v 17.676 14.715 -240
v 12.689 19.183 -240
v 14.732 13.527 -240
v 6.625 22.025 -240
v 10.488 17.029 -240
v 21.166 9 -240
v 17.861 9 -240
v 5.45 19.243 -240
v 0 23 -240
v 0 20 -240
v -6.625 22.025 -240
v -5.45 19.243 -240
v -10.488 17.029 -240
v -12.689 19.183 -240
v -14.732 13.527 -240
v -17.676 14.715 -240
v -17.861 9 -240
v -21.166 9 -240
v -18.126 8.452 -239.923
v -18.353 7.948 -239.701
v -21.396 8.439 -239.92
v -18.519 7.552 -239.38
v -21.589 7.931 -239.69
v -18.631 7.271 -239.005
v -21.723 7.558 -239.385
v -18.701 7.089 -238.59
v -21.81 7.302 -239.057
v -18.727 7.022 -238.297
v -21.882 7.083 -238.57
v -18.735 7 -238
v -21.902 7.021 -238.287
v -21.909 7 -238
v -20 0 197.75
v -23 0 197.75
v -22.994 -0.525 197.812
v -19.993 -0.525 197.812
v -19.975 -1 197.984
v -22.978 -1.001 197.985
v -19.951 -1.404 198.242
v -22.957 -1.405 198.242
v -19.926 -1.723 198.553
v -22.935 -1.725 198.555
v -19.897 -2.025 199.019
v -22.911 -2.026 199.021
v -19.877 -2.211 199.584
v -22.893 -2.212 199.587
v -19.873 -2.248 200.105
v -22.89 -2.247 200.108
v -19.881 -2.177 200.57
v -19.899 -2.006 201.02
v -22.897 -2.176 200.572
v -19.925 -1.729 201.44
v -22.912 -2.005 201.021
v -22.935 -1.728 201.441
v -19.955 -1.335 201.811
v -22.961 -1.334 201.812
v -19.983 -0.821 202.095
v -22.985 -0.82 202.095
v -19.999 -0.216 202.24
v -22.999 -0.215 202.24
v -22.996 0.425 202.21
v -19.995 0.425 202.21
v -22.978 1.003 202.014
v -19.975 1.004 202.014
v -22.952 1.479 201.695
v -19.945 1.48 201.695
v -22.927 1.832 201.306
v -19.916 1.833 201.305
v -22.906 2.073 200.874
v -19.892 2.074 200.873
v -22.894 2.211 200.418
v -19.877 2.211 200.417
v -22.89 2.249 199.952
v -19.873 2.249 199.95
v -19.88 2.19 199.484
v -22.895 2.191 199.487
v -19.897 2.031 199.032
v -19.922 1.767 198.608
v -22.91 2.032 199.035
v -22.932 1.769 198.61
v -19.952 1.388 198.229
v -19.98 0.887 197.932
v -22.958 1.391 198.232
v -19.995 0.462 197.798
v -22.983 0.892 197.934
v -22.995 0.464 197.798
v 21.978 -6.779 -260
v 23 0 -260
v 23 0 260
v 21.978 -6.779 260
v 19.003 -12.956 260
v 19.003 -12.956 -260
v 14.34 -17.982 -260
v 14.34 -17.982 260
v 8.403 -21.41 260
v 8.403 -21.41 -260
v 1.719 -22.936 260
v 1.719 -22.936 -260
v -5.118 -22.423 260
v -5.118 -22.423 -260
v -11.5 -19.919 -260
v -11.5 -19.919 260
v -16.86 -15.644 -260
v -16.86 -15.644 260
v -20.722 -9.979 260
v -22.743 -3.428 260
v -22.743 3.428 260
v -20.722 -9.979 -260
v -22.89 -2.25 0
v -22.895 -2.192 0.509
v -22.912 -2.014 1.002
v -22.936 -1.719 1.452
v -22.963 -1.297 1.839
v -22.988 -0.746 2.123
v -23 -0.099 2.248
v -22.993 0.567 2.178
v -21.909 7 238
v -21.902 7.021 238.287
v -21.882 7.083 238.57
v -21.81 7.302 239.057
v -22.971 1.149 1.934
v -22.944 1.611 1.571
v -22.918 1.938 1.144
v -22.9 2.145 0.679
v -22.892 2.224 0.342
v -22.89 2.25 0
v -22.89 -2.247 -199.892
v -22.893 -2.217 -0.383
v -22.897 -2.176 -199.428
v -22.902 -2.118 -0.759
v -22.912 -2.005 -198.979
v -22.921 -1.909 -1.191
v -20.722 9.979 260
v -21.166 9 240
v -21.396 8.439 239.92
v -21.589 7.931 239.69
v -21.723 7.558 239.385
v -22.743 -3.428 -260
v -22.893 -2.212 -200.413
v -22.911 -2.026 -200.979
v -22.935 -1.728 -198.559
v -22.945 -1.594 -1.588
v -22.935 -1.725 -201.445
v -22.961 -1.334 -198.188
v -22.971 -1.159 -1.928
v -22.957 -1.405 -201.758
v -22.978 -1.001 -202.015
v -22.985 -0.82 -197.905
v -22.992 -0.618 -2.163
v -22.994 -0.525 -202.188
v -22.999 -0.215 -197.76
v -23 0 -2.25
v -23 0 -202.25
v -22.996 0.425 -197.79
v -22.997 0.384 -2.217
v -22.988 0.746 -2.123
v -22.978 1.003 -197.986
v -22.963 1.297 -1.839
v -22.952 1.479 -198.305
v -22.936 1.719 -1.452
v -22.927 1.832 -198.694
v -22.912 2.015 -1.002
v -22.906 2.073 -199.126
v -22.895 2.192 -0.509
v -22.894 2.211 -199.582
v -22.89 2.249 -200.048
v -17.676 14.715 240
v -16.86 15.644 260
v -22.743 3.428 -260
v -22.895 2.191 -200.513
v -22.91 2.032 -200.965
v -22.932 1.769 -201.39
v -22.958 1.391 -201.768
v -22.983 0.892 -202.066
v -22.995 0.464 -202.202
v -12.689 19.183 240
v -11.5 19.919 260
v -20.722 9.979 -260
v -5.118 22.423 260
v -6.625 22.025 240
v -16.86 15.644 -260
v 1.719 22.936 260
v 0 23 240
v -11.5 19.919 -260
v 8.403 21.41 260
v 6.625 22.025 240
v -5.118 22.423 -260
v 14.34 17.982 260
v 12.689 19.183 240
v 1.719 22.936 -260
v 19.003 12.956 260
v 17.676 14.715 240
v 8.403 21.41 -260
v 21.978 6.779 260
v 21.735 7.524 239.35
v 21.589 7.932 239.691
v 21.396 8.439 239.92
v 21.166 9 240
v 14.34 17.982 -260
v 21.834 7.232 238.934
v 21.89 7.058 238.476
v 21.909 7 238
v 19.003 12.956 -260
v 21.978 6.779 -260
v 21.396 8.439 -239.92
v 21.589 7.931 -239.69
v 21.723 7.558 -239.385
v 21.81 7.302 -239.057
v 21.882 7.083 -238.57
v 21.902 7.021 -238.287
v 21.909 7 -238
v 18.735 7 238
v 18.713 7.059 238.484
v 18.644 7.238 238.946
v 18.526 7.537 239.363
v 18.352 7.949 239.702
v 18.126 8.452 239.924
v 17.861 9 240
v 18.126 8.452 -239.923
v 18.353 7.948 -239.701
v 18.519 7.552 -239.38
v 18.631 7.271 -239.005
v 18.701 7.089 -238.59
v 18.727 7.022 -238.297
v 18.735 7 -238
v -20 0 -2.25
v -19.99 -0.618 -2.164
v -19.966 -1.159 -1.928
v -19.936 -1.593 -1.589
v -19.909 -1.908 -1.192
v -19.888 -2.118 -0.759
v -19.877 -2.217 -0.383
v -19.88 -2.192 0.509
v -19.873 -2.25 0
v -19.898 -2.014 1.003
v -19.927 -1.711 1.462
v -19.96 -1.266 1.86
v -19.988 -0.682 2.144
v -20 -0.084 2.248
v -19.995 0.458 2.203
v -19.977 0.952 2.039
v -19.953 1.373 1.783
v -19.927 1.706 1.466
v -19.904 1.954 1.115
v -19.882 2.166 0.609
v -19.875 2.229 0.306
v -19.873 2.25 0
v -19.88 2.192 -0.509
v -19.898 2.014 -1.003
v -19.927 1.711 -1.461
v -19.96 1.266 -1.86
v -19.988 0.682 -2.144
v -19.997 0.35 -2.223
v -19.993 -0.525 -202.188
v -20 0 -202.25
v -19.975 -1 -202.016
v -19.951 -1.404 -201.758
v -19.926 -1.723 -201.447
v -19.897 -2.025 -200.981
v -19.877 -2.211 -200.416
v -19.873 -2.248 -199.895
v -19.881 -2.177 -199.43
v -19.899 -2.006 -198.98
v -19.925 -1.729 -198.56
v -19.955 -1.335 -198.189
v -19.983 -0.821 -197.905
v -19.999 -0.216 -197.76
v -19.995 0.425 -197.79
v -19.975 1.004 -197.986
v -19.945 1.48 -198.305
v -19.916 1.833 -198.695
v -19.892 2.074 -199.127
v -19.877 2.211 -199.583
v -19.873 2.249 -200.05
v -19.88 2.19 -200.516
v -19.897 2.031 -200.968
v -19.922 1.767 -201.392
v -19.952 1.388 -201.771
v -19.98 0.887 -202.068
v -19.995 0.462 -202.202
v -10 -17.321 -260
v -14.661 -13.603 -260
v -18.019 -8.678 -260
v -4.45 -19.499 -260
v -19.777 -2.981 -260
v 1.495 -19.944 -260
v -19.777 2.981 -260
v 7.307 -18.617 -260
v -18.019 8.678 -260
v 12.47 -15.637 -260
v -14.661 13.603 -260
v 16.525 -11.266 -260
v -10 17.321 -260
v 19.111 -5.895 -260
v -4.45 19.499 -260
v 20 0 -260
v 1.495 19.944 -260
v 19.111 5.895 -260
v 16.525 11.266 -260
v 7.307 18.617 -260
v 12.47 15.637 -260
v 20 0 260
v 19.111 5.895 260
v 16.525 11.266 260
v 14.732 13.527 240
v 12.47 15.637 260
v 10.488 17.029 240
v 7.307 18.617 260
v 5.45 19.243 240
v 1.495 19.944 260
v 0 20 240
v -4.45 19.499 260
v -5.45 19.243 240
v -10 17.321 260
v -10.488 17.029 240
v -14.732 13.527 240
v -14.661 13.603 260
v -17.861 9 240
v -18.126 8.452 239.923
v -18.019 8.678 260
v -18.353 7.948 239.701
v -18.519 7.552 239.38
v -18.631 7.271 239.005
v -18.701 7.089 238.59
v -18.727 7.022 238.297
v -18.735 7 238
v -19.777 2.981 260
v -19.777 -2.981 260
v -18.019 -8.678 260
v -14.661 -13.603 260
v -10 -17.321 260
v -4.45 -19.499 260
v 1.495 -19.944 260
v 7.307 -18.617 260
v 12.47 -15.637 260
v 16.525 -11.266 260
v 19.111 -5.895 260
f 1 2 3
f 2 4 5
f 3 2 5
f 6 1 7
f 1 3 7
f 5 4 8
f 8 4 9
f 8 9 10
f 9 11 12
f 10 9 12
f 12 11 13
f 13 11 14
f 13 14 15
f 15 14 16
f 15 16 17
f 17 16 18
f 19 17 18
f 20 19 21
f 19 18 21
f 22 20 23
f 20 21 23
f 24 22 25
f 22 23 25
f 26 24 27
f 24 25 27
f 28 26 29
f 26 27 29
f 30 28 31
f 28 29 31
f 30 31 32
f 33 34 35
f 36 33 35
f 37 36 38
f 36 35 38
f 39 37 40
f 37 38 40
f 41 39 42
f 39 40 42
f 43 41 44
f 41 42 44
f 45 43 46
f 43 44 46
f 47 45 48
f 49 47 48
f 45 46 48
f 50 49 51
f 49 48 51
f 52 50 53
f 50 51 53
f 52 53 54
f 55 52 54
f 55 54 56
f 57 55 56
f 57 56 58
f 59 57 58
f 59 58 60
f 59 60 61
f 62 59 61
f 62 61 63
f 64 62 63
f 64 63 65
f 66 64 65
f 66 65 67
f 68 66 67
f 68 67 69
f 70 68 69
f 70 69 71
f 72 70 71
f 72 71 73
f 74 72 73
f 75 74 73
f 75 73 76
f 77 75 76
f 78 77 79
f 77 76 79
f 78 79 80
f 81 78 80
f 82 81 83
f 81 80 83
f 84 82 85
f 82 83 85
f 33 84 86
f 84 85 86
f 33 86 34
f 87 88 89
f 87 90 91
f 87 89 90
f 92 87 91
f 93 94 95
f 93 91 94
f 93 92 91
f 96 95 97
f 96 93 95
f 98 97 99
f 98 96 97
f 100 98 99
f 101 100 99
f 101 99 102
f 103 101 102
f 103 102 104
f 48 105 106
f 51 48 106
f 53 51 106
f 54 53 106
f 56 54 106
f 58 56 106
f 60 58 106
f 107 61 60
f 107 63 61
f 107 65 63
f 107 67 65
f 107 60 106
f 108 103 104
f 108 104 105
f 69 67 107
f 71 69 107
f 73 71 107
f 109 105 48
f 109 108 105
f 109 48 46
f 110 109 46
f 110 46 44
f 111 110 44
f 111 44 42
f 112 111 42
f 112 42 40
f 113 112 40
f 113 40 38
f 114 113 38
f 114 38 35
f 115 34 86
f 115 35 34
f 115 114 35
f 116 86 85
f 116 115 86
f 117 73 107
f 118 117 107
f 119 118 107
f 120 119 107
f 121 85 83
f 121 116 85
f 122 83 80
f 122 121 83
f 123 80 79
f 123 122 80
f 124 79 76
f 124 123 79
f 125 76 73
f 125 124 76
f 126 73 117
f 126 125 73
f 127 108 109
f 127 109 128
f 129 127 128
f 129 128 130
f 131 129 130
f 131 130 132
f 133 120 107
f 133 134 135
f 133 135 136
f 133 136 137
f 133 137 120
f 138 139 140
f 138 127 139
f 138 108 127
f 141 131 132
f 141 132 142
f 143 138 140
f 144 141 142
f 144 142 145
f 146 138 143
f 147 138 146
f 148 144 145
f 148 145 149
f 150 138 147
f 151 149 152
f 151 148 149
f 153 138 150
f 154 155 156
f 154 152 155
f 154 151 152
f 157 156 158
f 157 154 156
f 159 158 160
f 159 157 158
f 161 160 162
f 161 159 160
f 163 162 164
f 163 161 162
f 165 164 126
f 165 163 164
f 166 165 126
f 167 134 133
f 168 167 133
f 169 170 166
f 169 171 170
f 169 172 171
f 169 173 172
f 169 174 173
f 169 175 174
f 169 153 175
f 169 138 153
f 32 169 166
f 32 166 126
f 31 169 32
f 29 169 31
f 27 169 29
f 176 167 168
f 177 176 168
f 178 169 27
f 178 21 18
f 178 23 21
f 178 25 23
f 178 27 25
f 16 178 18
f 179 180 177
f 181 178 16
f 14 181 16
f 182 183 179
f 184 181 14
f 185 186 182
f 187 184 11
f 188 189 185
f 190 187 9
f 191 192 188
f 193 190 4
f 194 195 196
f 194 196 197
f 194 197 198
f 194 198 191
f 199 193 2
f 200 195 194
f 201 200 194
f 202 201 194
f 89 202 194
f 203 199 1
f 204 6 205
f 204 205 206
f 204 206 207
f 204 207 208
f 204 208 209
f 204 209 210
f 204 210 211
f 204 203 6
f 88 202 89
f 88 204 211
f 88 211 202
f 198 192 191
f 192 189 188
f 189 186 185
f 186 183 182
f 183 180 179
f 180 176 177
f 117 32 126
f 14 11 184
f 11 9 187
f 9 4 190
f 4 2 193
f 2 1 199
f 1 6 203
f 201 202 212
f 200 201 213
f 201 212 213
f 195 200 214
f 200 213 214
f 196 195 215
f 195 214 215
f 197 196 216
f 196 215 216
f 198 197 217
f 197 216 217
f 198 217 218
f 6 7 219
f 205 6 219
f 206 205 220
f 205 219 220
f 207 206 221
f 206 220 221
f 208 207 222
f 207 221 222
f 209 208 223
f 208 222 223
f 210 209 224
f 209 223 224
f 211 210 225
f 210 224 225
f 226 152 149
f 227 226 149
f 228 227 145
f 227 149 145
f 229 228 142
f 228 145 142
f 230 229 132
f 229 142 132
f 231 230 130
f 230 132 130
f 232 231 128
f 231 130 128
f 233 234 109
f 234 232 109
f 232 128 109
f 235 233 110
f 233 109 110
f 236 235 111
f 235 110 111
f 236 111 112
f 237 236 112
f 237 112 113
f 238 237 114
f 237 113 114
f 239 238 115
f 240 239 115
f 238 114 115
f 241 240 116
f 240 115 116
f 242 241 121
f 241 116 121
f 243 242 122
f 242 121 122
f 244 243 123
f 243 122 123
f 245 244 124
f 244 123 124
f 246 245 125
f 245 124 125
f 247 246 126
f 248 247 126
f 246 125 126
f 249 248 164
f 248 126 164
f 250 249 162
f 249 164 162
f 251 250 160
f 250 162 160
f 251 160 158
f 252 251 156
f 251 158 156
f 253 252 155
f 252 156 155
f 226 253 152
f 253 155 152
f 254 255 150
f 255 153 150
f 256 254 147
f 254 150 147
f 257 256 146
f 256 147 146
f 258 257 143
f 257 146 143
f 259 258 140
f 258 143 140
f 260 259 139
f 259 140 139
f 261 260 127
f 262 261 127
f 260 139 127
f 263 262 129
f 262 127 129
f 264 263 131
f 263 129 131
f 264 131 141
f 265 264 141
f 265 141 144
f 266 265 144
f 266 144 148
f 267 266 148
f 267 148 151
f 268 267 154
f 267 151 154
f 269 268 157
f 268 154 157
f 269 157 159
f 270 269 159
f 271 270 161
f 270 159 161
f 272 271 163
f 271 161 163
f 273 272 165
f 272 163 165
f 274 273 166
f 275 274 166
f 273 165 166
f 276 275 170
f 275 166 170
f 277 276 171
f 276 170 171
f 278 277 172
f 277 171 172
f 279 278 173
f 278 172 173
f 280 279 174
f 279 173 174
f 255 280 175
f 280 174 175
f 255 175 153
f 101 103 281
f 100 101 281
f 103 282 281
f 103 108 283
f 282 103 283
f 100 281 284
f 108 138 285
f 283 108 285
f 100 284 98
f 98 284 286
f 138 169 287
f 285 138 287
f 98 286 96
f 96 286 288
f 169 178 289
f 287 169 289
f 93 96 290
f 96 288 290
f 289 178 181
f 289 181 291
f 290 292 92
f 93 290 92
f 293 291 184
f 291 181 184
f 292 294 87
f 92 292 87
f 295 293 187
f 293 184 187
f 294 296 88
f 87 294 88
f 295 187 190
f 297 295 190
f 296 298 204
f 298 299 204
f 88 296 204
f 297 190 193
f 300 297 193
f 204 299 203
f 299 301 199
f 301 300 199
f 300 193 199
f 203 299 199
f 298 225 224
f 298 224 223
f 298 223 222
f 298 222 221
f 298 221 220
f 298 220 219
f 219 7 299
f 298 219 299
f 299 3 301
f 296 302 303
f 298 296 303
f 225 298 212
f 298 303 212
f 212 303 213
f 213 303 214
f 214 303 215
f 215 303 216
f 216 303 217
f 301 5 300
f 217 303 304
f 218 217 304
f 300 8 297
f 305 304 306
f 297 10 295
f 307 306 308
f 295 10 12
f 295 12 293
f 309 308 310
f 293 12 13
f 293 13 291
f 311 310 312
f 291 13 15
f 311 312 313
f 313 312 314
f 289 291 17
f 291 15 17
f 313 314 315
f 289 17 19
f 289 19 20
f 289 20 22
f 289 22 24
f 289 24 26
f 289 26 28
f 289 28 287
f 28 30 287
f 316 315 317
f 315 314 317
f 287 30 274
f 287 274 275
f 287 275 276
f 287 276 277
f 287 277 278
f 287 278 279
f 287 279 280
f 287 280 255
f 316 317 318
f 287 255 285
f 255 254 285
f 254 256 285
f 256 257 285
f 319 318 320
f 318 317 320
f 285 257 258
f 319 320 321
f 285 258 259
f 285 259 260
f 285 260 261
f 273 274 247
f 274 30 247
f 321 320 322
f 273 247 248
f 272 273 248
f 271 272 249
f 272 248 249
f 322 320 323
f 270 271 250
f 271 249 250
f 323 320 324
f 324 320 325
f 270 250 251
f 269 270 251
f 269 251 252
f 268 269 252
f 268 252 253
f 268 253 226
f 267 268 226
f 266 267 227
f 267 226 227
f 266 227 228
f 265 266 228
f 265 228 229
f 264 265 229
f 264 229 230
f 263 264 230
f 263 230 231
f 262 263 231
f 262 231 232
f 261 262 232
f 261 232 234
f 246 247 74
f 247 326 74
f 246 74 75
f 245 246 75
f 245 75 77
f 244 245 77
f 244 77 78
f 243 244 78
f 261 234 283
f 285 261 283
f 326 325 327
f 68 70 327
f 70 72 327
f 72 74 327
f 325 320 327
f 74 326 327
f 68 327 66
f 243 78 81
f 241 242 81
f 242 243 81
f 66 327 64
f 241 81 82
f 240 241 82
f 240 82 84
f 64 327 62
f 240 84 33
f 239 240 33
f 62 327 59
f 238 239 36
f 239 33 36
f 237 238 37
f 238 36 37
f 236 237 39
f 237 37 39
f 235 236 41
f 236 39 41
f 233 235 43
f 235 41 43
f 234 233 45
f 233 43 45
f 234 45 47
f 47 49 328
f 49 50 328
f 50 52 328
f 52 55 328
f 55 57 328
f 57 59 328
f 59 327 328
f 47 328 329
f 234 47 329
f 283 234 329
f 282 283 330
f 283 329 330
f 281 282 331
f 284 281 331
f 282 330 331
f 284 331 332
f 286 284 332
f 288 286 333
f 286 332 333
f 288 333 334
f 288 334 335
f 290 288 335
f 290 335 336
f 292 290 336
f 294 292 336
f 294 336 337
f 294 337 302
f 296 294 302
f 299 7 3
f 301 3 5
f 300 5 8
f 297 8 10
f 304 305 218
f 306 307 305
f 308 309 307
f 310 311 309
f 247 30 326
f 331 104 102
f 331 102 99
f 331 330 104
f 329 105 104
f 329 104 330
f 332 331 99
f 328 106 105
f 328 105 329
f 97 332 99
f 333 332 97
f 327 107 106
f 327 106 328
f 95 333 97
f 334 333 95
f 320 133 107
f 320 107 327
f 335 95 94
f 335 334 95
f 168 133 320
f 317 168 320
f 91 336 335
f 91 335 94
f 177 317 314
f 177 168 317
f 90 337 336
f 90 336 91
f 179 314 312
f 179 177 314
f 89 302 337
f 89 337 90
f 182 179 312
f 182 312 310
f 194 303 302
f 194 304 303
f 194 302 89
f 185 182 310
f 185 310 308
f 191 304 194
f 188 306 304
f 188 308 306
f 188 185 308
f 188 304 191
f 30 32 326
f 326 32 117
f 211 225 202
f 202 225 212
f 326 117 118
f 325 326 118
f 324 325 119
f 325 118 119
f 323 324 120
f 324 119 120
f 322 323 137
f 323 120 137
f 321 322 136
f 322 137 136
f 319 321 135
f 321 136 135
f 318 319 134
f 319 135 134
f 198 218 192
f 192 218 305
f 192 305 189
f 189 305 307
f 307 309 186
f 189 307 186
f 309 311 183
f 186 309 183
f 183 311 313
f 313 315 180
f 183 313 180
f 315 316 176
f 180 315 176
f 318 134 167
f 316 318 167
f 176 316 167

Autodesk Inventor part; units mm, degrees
ref_plane "YZ Plane" through (0, 0, 0) normal (1, 0, 0) x (0, 1, 0)
ref_plane "XZ Plane" through (0, 0, 0) normal (0, 1, 0) x (-1, 0, 0)
ref_plane "XY Plane" through (0, 0, 0) normal (0, 0, 1) x (1, 0, 0)
sketch "Sketch1" plane through (0, 0, 0) normal (0, 0, 1) x (1, 0, 0)
  circle A0 centre (0, 0) radius 20
  circle A1 centre (0, 0) radius 23
  dimension "d0" = 40
  dimension "d1" = 46
extrude "Extrusion1" add sketch "Sketch1" along normal mid plane 520
sketch "Sketch2" plane through (0, 0, 0) normal (1, 0, 0) x (0, 1, 0)
  line L0 (0, 280) -> (0, -280) projected
  line L1 (-280, 0) -> (280, 0) projected
  point P0 (0, 0)
  point P1 (0, 200)
  point P2 (0, 0)
  point P3 (0, -200)
  dimension "d4" = 200
  dimension "d5" = 200
hole "Hole1" at (0, 0, 200) at (0, 0, 0) at (0, 0, -200) direction (-1, 0, 0) diameter 4.5 end through all clearance for "Flat Head Machine Screw" size "M4" standard "Ansi Metric M Profile"
sketch "Sketch3" plane through (0, 0, 0) normal (1, 0, 0) x (0, 1, 0)
  line L0 (23, -240) -> (7, -240)
  line L1 (7, -240) -> (7, 240)
  line L2 (7, 240) -> (23, 240)
  line L3 (23, 240) -> (23, -240)
  line L4 (23, 260) -> (-23, 260) projected
  line L5 (-23, -260) -> (23, -260) projected
  line L6 (0, 350) -> (0, -350) projected
  point P0 (0, 0)
  dimension "d13" = 20
  dimension "d14" = 20
  dimension "d15" = 7
extrude "Extrusion2" cut sketch "Sketch3" along normal through all both and the other way through all
fillet "Fillet1" radius 2 4 edges at (20.3219, 7, -240) (-20.3219, 7, -240) (20.3219, 7, 240) (-20.3219, 7, 240)
equation "\"d5\" = d4"
properties part number "Pancake_Tilt Pipe" material "PVC-Piping"
